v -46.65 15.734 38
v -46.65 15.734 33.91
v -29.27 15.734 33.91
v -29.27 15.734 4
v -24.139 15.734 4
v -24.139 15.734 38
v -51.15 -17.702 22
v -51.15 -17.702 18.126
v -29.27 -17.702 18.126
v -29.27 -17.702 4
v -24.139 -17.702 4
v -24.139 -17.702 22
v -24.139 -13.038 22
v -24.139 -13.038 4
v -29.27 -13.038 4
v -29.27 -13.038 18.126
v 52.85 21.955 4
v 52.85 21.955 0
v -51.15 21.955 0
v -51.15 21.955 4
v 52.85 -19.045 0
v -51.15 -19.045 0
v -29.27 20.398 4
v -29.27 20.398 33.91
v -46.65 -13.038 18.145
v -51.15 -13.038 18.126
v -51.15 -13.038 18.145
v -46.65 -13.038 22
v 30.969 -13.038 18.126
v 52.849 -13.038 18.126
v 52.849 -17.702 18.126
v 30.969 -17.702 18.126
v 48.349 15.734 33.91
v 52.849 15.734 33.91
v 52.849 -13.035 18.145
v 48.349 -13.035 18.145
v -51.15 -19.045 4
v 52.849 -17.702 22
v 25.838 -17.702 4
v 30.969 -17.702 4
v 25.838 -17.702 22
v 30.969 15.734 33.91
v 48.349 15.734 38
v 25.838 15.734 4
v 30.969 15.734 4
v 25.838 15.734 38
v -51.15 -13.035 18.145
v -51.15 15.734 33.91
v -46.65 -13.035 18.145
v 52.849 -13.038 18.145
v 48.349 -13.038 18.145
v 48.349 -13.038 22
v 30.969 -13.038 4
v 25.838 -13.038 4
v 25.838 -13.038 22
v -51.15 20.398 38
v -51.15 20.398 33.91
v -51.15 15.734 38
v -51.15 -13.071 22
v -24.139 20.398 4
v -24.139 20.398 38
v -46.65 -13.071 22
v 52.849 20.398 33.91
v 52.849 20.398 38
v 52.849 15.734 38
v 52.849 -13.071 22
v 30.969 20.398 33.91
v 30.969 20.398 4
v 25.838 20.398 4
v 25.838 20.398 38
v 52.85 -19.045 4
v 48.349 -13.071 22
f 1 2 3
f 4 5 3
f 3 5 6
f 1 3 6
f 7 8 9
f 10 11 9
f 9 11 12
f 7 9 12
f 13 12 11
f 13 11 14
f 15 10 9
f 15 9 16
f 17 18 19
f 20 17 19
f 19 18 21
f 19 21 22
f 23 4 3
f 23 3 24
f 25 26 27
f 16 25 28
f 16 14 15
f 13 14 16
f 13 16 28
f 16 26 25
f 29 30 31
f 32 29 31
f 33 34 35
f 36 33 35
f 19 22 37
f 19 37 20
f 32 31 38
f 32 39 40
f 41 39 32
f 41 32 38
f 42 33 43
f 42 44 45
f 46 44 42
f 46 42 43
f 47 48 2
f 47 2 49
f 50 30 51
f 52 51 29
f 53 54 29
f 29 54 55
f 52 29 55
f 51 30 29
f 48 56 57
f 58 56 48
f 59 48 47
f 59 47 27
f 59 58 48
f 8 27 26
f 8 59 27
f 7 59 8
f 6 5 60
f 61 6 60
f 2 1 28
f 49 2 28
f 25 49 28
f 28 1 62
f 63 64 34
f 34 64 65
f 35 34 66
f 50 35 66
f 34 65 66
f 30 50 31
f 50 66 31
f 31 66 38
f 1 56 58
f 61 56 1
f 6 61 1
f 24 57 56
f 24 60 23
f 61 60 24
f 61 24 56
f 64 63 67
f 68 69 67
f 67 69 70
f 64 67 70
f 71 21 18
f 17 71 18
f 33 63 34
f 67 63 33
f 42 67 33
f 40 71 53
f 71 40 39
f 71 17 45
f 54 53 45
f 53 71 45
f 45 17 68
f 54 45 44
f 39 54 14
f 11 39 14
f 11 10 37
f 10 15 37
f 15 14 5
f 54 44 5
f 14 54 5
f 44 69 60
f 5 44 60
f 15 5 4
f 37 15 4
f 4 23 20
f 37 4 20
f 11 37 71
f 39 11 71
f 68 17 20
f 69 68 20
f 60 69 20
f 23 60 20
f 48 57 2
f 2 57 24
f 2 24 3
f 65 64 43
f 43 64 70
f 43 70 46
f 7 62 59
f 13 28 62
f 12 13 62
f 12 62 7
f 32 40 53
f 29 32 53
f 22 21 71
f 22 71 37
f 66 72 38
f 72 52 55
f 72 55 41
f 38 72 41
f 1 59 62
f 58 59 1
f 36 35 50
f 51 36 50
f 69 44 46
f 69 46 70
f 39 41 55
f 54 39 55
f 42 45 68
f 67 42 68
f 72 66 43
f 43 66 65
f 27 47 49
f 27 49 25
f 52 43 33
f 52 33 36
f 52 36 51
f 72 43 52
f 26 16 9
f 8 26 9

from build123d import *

# Parameters (mm, degrees)
F0_W      = 52
F0_H      = 41
F1_DEPTH  = 4
F2_W      = 5.1310285926
F2_H      = 4.6637309715
F3_DEPTH  = 34
F4_DEPTH  = 18
F5_W      = 4.6637309715
F5_H      = 4.0902358592
F6_DEPTH  = 21.88
F7_W      = 4.6637309715
F7_H      = 3.8742293864
F8_DEPTH  = 21.88
F10_DEPTH = 4.5


with BuildPart() as f1:
    # F0 (on Top) → F1 (new body)
    with BuildSketch(Plane.XY):
        with Locations((-25.150391832, 1.4550268714)):
            Rectangle(F0_W, F0_H)
    extrude(amount=F1_DEPTH)

    # F2 (on face) → F3 (join)
    with BuildSketch(Plane.XY.offset(4)):
        with Locations((-26.7044808716, 18.0663228966)):
            Rectangle(F2_W, F2_H)
    extrude(amount=F3_DEPTH)

    # F2 (on face) → F4 (join)
    with BuildSketch(Plane.XY.offset(4)):
        with Locations((-26.7044808716, -15.3699782677)):
            Rectangle(F2_W, F2_H)
    extrude(amount=F4_DEPTH)

    # F5 (on face) → F6 (join)
    with BuildSketch(Plane(origin=(-29.2699951679, 0, 0), x_dir=(0, -1, 0), z_dir=(-1, 0, 0))):
        with Locations((-18.0663228966, 35.9548820704)):
            Rectangle(F5_W, F5_H)
    extrude(amount=F6_DEPTH)

    # F7 (on face) → F8 (join)
    with BuildSketch(Plane(origin=(-29.2699951679, 0, 0), x_dir=(0, -1, 0), z_dir=(-1, 0, 0))):
        with Locations((15.3699782677, 20.0628853068)):
            Rectangle(F7_W, F7_H)
    extrude(amount=F8_DEPTH)

    # F9 (on face) → F10 (join)
    with BuildSketch(Plane(origin=(-51.1499951679, 0, 0), x_dir=(0, -1, 0), z_dir=(-1, 0, 0))):
        Polygon((14.0116587281, 21.4774478227), (-15.7344574109, 38), (-15.7344574109, 33.9097641408), (13.0349043757, 18.1450489908), (14.0116587281, 18.1450489908), align=None)
    extrude(amount=-F10_DEPTH)

    # F11: F1 across face


with BuildPart() as f1_1:
    add(f1.part)
    add(f1.part.mirror(Plane(origin=(0.849608168, 1.4550268714, 2), x_dir=(0, 1, 0), z_dir=(1, 0, 0))))


solid = f1_1.part
